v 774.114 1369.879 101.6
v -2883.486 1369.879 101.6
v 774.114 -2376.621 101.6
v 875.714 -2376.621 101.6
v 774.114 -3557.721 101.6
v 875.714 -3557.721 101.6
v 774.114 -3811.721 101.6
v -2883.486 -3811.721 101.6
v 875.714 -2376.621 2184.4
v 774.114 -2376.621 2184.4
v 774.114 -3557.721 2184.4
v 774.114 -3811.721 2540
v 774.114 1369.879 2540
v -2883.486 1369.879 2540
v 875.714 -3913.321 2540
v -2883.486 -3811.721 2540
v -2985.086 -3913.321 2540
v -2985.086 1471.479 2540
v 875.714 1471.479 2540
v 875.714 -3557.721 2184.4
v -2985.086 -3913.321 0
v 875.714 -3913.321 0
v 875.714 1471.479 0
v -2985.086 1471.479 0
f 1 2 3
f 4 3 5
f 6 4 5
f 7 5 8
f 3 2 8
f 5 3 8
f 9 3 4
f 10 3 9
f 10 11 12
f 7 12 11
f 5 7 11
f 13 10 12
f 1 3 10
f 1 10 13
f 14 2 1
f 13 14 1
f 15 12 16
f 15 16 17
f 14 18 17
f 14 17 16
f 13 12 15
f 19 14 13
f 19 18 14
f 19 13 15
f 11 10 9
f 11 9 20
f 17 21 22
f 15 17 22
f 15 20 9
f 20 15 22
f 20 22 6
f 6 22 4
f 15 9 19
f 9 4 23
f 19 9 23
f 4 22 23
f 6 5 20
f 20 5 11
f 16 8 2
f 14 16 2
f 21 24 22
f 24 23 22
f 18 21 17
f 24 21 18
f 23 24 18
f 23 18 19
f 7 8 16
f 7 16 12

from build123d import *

# Parameters (mm, degrees)
F0_W     = 3860.8
F0_H     = 5384.8
F0_W_2   = 3657.6
F0_H_2   = 5181.6
F1_DEPTH = 2540
F2_W     = 5181.6
F2_H     = 101.6
F3_DEPTH = 3657.6
F4_W     = 1181.1
F4_H     = 2082.8
F5_DEPTH = 101.601


with BuildPart() as f1:
    # F0 (on Top) → F1 (new body)
    with BuildSketch(Plane.XY):
        with Locations((-1054.686203, -1220.920803)):
            Rectangle(F0_W, F0_H)
        with Locations((-1054.686203, -1220.920803)):
            Rectangle(F0_W_2, F0_H_2, mode=Mode.SUBTRACT)
    extrude(amount=F1_DEPTH)

    # F2 (on face) → F3 (join, through all)
    with BuildSketch(Plane(origin=(774.113797, 0, 0), x_dir=(0, -1, 0), z_dir=(-1, 0, 0))):
        with Locations((1220.920803, 50.8)):
            Rectangle(F2_W, F2_H)
    extrude(amount=F3_DEPTH)

    # F4 (on face) → F5 (cut, through all)
    with BuildSketch(Plane(origin=(774.113797, 0, 0), x_dir=(0, -1, 0), z_dir=(-1, 0, 0))):
        with Locations((2967.170803, 1143)):
            Rectangle(F4_W, F4_H)
    extrude(amount=-F5_DEPTH, mode=Mode.SUBTRACT)


solid = f1.part
